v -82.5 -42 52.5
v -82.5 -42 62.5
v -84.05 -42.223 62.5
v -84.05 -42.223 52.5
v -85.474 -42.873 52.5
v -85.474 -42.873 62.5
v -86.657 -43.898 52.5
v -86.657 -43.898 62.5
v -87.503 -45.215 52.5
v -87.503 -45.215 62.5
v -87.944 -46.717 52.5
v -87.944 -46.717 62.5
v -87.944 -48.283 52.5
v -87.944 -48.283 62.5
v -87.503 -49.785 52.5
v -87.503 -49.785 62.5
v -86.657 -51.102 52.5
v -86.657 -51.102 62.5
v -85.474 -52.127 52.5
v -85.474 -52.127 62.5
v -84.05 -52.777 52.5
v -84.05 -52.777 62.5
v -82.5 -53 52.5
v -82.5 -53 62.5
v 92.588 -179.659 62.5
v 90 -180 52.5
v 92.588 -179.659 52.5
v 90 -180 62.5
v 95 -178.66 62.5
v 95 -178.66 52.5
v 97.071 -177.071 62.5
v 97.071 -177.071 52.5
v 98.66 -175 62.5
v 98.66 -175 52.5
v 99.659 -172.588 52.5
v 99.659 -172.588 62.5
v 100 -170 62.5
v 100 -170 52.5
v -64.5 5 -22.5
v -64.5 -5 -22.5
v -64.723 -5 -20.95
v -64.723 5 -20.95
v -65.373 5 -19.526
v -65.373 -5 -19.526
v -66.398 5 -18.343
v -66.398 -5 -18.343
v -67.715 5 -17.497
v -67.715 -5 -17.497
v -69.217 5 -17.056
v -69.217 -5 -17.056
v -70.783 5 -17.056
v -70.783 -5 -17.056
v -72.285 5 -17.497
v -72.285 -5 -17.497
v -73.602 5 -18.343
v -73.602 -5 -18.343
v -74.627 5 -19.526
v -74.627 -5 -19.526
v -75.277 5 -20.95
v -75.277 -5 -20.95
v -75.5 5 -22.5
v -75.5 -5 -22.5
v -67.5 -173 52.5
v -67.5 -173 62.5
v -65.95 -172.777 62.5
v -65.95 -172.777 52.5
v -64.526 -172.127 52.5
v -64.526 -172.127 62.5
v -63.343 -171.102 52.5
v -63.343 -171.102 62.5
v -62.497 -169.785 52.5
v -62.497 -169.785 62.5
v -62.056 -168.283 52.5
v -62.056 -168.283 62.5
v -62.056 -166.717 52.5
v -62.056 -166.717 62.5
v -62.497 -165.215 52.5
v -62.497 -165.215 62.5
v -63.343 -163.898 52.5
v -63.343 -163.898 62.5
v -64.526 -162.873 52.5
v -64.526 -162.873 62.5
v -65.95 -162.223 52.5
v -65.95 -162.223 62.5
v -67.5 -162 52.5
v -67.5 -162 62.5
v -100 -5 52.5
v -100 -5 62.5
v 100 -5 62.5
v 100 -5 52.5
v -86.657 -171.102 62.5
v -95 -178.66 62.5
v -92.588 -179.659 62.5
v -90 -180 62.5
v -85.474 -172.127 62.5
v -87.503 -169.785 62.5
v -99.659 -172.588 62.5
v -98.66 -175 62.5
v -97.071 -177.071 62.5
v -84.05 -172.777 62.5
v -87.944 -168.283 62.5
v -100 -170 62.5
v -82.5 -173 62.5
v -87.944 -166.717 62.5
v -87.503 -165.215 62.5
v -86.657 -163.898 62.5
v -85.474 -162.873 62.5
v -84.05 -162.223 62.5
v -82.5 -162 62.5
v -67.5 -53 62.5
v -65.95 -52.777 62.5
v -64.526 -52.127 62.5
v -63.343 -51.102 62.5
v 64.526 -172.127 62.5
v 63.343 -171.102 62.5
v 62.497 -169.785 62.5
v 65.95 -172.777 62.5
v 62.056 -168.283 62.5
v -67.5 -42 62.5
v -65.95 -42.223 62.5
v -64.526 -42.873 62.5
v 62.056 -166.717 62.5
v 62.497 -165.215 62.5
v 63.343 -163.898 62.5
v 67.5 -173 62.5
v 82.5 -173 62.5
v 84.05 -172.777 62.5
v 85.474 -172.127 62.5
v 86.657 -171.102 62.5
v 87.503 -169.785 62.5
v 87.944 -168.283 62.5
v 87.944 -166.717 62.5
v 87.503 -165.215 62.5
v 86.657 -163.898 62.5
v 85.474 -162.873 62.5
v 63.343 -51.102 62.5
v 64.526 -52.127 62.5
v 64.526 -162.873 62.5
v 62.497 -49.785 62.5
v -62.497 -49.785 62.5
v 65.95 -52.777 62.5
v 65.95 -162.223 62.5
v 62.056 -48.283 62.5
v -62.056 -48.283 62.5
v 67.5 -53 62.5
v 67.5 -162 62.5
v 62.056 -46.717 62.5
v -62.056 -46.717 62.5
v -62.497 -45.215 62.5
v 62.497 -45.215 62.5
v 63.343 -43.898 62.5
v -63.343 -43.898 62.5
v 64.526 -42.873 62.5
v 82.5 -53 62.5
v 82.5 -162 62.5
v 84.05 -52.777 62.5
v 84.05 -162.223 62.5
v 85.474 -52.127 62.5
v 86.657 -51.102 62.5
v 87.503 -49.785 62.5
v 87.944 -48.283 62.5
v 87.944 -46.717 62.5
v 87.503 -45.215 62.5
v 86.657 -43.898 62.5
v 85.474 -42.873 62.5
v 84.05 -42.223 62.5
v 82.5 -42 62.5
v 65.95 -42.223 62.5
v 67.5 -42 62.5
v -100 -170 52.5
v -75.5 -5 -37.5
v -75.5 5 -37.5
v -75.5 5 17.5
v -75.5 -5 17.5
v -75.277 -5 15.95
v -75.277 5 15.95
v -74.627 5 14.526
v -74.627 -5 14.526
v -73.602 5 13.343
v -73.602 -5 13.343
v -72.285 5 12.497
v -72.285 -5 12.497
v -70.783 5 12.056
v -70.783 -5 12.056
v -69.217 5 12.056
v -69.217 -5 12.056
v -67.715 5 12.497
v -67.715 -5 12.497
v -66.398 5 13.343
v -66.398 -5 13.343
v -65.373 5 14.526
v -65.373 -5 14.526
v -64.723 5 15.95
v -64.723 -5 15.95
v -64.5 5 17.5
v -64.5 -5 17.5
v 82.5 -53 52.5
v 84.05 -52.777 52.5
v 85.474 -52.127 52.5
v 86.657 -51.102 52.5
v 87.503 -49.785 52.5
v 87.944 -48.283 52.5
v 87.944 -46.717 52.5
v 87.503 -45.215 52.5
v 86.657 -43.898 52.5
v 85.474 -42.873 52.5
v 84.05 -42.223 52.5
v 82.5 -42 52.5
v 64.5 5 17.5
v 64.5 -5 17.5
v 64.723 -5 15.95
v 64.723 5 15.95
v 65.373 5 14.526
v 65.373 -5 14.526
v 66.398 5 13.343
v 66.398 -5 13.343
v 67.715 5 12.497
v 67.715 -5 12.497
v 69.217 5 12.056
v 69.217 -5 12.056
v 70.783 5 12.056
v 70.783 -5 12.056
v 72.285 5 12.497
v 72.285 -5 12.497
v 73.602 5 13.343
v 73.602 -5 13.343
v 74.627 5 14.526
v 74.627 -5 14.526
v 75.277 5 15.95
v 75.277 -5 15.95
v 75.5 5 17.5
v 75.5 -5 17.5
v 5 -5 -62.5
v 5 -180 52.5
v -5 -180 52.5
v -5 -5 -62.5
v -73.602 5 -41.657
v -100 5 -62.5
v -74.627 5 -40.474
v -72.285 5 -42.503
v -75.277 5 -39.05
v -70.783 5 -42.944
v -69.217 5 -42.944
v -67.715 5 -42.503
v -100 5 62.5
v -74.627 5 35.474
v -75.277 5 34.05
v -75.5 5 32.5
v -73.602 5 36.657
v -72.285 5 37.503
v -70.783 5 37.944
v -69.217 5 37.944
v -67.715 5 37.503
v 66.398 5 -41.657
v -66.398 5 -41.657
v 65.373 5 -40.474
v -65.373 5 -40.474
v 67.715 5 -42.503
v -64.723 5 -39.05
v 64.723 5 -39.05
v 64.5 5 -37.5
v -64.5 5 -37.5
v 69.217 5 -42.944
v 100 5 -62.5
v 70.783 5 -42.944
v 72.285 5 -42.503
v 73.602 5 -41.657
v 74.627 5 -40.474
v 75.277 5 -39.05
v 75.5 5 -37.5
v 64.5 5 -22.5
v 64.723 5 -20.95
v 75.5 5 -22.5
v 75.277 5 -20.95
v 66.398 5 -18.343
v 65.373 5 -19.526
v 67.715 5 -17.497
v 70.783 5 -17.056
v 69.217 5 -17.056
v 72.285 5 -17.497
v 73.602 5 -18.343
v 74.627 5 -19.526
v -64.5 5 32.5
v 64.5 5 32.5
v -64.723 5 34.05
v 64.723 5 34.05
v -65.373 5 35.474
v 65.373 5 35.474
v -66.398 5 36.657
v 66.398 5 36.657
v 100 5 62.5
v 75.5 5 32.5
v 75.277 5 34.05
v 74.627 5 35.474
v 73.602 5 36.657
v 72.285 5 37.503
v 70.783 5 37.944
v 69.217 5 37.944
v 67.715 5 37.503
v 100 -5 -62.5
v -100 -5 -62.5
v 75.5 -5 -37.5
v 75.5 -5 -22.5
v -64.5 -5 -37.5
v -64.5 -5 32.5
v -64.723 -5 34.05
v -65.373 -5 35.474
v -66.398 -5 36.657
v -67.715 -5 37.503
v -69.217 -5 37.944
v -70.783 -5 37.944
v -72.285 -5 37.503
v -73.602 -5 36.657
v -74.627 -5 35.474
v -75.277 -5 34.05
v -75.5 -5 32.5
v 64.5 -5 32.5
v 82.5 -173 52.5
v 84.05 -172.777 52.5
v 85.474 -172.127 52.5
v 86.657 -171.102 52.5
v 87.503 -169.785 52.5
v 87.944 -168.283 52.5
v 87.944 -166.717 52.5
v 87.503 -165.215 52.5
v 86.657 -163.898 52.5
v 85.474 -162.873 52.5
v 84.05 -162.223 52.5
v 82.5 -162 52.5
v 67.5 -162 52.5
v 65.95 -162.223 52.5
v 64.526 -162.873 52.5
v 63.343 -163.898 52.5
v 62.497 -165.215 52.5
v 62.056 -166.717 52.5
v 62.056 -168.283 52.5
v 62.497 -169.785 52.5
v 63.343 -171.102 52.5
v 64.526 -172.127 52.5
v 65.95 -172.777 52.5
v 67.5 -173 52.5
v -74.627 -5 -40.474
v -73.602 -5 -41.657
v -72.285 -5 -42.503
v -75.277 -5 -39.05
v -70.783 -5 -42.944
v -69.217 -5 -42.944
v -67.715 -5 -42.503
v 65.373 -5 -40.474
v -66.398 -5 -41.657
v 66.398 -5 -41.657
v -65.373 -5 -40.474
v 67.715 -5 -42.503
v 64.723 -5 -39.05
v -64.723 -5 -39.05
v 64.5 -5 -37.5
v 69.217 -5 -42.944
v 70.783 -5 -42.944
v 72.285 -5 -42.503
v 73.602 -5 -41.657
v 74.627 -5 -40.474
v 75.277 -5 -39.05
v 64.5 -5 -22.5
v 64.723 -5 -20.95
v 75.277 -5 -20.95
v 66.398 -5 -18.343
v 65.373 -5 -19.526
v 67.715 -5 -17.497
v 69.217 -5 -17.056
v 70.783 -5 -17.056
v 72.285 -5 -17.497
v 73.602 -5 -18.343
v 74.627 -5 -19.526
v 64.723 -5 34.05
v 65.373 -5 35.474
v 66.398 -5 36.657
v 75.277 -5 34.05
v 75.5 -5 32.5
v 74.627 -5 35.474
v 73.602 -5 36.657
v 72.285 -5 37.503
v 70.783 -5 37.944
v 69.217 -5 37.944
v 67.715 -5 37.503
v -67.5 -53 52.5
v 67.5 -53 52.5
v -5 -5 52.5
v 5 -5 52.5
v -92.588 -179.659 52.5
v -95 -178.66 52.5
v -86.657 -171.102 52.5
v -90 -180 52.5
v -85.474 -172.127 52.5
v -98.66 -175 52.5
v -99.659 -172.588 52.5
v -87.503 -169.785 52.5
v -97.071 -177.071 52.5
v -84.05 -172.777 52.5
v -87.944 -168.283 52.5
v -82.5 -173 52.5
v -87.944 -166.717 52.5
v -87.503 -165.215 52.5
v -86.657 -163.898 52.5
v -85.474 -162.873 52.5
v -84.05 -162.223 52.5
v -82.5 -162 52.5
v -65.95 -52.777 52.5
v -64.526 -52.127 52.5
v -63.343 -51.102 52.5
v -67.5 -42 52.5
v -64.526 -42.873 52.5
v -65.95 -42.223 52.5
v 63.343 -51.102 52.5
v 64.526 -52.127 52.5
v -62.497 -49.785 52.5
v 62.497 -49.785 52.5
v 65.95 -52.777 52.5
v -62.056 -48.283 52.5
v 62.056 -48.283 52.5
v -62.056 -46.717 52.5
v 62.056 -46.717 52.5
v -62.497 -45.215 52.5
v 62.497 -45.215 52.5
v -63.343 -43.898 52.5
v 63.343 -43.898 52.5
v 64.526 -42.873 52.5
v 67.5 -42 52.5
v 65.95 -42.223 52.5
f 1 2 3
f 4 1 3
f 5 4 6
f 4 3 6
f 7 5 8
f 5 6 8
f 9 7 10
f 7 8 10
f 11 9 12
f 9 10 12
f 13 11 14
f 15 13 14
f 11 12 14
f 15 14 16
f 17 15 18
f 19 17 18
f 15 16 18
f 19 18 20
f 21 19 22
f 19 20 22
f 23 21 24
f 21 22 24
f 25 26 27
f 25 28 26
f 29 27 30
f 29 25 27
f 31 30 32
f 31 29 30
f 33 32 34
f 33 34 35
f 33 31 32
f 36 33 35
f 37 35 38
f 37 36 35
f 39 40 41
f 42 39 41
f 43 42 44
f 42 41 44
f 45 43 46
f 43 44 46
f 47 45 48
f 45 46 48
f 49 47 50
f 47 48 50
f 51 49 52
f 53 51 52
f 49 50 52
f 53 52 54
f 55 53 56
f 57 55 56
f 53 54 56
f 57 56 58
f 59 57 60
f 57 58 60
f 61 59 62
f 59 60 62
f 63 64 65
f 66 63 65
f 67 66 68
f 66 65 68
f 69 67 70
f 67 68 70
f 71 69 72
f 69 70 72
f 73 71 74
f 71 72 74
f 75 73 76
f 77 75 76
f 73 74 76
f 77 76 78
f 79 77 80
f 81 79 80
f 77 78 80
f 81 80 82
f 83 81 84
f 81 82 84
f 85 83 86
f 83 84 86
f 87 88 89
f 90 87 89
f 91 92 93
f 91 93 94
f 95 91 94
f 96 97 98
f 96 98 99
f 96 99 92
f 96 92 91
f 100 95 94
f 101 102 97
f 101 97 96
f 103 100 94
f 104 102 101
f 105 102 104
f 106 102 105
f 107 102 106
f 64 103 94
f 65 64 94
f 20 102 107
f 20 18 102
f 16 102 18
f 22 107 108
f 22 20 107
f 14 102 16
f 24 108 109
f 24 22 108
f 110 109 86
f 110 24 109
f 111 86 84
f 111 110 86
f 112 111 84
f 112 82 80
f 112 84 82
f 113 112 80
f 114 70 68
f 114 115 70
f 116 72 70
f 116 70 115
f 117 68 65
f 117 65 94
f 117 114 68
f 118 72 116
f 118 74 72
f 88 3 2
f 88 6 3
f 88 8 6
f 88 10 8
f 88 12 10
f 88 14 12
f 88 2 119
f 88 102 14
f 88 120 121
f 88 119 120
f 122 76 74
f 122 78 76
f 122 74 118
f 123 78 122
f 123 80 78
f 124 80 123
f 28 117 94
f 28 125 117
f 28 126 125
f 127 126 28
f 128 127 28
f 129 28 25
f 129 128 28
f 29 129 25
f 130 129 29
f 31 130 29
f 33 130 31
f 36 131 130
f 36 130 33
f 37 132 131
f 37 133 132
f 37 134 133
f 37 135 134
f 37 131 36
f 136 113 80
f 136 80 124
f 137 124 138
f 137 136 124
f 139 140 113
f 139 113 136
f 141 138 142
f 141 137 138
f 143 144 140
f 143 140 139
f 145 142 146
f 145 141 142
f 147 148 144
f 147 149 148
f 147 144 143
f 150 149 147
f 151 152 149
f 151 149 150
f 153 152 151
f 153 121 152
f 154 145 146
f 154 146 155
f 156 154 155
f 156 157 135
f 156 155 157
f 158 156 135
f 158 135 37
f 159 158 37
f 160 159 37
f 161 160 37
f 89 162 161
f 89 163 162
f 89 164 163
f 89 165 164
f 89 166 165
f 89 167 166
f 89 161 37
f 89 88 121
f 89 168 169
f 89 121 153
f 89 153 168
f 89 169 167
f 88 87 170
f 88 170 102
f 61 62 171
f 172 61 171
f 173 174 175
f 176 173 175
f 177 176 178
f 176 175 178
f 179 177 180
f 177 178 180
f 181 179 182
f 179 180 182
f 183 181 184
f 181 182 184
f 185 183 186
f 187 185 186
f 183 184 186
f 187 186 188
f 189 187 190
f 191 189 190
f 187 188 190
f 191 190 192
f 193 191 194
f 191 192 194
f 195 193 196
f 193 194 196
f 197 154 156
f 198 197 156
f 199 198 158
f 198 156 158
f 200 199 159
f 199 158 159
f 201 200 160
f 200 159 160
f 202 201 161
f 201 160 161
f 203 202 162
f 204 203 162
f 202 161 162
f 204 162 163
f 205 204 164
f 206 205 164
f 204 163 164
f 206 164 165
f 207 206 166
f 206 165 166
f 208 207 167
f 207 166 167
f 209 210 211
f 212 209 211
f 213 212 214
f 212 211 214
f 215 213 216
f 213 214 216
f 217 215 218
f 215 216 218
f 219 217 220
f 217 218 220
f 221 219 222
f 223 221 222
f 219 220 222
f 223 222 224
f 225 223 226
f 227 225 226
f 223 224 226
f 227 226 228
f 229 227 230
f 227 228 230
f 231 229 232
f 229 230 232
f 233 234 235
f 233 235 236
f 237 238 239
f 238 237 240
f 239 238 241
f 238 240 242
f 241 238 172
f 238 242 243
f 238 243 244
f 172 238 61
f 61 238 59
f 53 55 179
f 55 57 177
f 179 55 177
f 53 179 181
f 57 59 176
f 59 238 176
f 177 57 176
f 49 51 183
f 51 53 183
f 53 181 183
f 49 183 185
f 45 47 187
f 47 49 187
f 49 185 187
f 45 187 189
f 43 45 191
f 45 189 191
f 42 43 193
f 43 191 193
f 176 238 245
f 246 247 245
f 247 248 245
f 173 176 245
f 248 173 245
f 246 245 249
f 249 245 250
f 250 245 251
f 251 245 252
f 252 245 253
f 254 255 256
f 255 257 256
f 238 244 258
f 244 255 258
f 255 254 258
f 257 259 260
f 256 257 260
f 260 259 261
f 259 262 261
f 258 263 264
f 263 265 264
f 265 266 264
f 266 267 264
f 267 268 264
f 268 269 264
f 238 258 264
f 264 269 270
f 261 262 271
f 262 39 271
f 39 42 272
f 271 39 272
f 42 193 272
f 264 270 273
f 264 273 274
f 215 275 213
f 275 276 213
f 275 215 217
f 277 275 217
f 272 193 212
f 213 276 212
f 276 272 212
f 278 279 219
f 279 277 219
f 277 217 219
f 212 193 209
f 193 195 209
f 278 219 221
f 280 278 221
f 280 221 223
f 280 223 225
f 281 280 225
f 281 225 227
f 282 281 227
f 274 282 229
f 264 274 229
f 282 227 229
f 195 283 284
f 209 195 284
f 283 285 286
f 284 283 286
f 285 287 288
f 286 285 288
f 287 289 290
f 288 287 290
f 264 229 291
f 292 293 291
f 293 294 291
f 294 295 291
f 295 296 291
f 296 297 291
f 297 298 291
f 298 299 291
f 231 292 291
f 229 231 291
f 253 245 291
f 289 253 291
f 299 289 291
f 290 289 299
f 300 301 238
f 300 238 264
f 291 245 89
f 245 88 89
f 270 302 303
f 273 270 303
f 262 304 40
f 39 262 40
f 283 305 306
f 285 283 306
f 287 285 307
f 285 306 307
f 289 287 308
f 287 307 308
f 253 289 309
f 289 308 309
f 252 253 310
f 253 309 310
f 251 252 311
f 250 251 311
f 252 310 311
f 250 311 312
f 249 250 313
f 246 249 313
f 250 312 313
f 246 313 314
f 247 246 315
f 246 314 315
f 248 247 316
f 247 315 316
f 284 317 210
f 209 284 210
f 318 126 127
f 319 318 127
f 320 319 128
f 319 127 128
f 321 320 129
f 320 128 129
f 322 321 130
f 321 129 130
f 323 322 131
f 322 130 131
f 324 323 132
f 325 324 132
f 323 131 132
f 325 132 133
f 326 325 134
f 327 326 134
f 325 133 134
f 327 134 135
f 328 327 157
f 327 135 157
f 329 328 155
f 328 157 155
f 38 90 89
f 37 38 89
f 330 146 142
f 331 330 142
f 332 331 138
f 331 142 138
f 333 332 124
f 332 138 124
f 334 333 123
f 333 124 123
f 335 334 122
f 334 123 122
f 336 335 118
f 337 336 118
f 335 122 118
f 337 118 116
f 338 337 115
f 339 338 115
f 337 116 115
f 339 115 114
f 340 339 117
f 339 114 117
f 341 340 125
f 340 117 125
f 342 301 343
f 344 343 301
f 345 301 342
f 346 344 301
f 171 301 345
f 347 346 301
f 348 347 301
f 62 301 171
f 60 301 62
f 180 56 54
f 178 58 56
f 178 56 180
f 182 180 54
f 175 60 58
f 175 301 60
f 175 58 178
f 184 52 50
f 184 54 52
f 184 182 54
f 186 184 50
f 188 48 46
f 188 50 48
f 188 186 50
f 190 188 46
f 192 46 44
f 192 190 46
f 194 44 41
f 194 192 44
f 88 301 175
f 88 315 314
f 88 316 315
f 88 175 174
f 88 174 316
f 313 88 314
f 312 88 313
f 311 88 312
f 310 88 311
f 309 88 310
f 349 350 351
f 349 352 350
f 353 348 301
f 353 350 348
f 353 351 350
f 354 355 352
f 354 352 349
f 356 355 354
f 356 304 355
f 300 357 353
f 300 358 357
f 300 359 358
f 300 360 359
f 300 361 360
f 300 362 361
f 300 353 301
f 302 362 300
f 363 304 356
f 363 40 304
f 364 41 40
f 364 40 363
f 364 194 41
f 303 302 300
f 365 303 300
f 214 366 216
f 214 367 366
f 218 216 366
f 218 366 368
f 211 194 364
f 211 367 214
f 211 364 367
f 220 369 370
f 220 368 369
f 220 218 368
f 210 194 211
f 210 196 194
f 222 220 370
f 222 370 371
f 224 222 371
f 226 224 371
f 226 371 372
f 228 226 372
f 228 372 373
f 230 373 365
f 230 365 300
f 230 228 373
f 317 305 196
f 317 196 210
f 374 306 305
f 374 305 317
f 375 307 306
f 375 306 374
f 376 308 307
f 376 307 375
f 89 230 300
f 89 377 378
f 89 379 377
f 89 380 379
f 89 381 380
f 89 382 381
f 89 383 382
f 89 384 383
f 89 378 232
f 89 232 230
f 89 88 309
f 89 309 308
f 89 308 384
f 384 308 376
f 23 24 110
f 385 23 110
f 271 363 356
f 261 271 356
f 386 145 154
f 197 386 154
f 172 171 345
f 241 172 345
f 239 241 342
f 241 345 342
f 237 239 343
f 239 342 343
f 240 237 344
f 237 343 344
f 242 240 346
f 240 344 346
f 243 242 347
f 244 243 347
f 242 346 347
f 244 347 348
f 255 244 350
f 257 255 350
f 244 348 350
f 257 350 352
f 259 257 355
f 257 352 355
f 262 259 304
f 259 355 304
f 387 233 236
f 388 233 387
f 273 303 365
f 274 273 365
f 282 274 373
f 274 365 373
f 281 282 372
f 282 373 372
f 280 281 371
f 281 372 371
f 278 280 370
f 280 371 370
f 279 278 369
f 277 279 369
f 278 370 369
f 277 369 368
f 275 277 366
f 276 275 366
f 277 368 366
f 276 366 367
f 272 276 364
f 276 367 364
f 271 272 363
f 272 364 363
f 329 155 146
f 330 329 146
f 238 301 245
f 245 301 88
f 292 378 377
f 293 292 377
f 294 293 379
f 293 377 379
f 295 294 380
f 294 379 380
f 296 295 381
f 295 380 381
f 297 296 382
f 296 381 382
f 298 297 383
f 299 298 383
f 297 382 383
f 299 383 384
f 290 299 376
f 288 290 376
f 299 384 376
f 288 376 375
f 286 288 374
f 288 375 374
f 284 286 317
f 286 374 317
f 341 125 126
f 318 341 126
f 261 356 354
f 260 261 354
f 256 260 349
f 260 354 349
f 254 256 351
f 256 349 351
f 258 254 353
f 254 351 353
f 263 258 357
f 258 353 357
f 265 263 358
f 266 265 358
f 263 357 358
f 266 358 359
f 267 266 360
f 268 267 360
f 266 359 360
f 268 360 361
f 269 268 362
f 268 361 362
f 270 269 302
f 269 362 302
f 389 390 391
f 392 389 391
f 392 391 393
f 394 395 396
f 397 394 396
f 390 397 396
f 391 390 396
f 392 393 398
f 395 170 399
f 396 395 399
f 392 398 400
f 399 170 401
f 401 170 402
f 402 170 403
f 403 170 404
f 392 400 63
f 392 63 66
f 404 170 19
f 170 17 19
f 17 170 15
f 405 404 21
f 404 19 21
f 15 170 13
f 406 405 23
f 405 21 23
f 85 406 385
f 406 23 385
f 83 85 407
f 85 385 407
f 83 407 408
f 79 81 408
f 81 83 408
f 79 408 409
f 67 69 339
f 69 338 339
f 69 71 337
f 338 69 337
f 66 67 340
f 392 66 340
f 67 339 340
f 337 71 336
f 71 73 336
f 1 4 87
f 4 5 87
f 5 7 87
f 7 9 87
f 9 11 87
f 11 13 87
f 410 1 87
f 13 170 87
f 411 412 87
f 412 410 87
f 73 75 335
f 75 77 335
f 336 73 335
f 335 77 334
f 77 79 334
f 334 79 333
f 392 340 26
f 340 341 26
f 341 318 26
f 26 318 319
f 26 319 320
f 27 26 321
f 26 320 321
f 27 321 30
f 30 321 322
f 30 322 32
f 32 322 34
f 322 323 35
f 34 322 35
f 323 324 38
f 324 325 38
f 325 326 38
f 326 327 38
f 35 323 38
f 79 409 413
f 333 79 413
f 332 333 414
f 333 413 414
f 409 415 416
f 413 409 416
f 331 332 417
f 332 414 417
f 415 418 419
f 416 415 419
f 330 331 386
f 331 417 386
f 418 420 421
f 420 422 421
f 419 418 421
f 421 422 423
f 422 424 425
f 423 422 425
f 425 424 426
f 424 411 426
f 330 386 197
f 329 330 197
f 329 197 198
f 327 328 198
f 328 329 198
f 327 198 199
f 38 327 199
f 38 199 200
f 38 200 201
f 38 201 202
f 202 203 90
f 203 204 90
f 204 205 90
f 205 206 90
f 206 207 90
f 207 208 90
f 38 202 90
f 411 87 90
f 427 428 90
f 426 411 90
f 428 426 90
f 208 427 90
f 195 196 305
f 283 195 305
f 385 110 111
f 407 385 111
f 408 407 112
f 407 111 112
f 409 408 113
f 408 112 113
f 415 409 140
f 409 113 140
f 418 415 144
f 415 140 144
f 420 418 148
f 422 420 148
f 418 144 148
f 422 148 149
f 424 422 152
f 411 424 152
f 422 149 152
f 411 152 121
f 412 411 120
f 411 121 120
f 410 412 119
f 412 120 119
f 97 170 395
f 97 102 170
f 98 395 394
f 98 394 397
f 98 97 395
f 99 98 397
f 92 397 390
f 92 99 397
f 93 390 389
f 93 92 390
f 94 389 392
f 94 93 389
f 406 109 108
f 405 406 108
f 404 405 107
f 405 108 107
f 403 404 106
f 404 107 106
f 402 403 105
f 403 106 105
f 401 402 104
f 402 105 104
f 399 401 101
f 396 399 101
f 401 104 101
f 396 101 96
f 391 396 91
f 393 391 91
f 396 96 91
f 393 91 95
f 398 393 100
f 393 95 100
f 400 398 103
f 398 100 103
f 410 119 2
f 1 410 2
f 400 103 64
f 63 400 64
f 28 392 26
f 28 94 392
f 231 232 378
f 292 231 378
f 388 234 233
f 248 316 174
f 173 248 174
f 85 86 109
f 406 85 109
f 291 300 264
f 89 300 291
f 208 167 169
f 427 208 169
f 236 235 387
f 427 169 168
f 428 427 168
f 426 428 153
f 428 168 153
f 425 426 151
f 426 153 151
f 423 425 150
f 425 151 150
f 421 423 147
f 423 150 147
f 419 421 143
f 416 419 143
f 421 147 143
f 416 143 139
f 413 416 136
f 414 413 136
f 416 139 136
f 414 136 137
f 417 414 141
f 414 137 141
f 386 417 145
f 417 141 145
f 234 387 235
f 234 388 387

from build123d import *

# Parameters (mm, degrees)
F0_W     = 200
F0_H     = 125
F1_DEPTH = 5
F2_W     = 200
F2_H     = 10
F3_DEPTH = 175
F5_DEPTH = 10.001
F7_DEPTH = 5
F9_DEPTH = 125.001
F10_R    = 10


with BuildPart() as f1:
    # F0 (on Front) → F1 (new body, symmetric)
    with BuildSketch(Plane.XZ):
        Rectangle(F0_W, F0_H)
    extrude(amount=F1_DEPTH, both=True)

    # F4 (on face) → F5 (cut, through all)
    with BuildSketch(Plane.XZ.offset(5)):
        with BuildLine():
            ThreePointArc((-64.5, 32.5), (-70, 38), (-75.5, 32.5))
            Line((-75.5, 32.5), (-75.5, 17.5))
            ThreePointArc((-75.5, 17.5), (-70, 12), (-64.5, 17.5))
            Line((-64.5, 17.5), (-64.5, 32.5))
        make_face()
        with BuildLine():
            ThreePointArc((-64.5, -22.5), (-70, -17), (-75.5, -22.5))
            Line((-75.5, -22.5), (-75.5, -37.5))
            ThreePointArc((-75.5, -37.5), (-70, -43), (-64.5, -37.5))
            Line((-64.5, -37.5), (-64.5, -22.5))
        make_face()
        with BuildLine():
            ThreePointArc((75.5, 32.5), (70, 38), (64.5, 32.5))
            Line((64.5, 32.5), (64.5, 17.5))
            ThreePointArc((64.5, 17.5), (70, 12), (75.5, 17.5))
            Line((75.5, 17.5), (75.5, 32.5))
        make_face()
        with BuildLine():
            Line((75.5, -37.5), (75.5, -22.5))
            ThreePointArc((75.5, -22.5), (70, -17), (64.5, -22.5))
            Line((64.5, -22.5), (64.5, -37.5))
            ThreePointArc((64.5, -37.5), (70, -43), (75.5, -37.5))
        make_face()
    extrude(amount=-F5_DEPTH, mode=Mode.SUBTRACT)


with BuildPart() as f3:
    # F2 (on face) → F3 (new body)
    with BuildSketch(Plane.XZ.offset(5)):
        with Locations((0, 57.5)):
            Rectangle(F2_W, F2_H)
    extrude(amount=F3_DEPTH)

    # F8 (on face) → F9 (cut, through all)
    with BuildSketch(Plane.XY.offset(62.5)):
        with BuildLine():
            ThreePointArc((67.5, -42), (62, -47.5), (67.5, -53))
            Line((67.5, -53), (82.5, -53))
            ThreePointArc((82.5, -53), (88, -47.5), (82.5, -42))
            Line((82.5, -42), (67.5, -42))
        make_face()
        with BuildLine():
            ThreePointArc((67.5, -162), (62, -167.5), (67.5, -173))
            Line((67.5, -173), (82.5, -173))
            ThreePointArc((82.5, -173), (88, -167.5), (82.5, -162))
            Line((82.5, -162), (67.5, -162))
        make_face()
        with BuildLine():
            Line((-82.5, -53), (-67.5, -53))
            ThreePointArc((-67.5, -53), (-62, -47.5), (-67.5, -42))
            Line((-67.5, -42), (-82.5, -42))
            ThreePointArc((-82.5, -42), (-88, -47.5), (-82.5, -53))
        make_face()
        with BuildLine():
            Line((-82.5, -173), (-67.5, -173))
            ThreePointArc((-67.5, -173), (-62, -167.5), (-67.5, -162))
            Line((-67.5, -162), (-82.5, -162))
            ThreePointArc((-82.5, -162), (-88, -167.5), (-82.5, -173))
        make_face()
    extrude(amount=-F9_DEPTH, mode=Mode.SUBTRACT)

    # F10
    f10_edges = [f3.edges().sort_by_distance(p)[0] for p in [
        (100, -180, 57.5),
        (-100, -180, 57.5),
    ]]
    fillet(f10_edges, radius=F10_R)


with BuildPart() as f7:
    # F6 (on Right) → F7 (new body, symmetric)
    with BuildSketch(Plane.YZ):
        Polygon((-5, 52.5), (-180, 52.5), (-5, -62.5), align=None)
    extrude(amount=F7_DEPTH, both=True)


solid = Compound([f1.part, f3.part, f7.part])
